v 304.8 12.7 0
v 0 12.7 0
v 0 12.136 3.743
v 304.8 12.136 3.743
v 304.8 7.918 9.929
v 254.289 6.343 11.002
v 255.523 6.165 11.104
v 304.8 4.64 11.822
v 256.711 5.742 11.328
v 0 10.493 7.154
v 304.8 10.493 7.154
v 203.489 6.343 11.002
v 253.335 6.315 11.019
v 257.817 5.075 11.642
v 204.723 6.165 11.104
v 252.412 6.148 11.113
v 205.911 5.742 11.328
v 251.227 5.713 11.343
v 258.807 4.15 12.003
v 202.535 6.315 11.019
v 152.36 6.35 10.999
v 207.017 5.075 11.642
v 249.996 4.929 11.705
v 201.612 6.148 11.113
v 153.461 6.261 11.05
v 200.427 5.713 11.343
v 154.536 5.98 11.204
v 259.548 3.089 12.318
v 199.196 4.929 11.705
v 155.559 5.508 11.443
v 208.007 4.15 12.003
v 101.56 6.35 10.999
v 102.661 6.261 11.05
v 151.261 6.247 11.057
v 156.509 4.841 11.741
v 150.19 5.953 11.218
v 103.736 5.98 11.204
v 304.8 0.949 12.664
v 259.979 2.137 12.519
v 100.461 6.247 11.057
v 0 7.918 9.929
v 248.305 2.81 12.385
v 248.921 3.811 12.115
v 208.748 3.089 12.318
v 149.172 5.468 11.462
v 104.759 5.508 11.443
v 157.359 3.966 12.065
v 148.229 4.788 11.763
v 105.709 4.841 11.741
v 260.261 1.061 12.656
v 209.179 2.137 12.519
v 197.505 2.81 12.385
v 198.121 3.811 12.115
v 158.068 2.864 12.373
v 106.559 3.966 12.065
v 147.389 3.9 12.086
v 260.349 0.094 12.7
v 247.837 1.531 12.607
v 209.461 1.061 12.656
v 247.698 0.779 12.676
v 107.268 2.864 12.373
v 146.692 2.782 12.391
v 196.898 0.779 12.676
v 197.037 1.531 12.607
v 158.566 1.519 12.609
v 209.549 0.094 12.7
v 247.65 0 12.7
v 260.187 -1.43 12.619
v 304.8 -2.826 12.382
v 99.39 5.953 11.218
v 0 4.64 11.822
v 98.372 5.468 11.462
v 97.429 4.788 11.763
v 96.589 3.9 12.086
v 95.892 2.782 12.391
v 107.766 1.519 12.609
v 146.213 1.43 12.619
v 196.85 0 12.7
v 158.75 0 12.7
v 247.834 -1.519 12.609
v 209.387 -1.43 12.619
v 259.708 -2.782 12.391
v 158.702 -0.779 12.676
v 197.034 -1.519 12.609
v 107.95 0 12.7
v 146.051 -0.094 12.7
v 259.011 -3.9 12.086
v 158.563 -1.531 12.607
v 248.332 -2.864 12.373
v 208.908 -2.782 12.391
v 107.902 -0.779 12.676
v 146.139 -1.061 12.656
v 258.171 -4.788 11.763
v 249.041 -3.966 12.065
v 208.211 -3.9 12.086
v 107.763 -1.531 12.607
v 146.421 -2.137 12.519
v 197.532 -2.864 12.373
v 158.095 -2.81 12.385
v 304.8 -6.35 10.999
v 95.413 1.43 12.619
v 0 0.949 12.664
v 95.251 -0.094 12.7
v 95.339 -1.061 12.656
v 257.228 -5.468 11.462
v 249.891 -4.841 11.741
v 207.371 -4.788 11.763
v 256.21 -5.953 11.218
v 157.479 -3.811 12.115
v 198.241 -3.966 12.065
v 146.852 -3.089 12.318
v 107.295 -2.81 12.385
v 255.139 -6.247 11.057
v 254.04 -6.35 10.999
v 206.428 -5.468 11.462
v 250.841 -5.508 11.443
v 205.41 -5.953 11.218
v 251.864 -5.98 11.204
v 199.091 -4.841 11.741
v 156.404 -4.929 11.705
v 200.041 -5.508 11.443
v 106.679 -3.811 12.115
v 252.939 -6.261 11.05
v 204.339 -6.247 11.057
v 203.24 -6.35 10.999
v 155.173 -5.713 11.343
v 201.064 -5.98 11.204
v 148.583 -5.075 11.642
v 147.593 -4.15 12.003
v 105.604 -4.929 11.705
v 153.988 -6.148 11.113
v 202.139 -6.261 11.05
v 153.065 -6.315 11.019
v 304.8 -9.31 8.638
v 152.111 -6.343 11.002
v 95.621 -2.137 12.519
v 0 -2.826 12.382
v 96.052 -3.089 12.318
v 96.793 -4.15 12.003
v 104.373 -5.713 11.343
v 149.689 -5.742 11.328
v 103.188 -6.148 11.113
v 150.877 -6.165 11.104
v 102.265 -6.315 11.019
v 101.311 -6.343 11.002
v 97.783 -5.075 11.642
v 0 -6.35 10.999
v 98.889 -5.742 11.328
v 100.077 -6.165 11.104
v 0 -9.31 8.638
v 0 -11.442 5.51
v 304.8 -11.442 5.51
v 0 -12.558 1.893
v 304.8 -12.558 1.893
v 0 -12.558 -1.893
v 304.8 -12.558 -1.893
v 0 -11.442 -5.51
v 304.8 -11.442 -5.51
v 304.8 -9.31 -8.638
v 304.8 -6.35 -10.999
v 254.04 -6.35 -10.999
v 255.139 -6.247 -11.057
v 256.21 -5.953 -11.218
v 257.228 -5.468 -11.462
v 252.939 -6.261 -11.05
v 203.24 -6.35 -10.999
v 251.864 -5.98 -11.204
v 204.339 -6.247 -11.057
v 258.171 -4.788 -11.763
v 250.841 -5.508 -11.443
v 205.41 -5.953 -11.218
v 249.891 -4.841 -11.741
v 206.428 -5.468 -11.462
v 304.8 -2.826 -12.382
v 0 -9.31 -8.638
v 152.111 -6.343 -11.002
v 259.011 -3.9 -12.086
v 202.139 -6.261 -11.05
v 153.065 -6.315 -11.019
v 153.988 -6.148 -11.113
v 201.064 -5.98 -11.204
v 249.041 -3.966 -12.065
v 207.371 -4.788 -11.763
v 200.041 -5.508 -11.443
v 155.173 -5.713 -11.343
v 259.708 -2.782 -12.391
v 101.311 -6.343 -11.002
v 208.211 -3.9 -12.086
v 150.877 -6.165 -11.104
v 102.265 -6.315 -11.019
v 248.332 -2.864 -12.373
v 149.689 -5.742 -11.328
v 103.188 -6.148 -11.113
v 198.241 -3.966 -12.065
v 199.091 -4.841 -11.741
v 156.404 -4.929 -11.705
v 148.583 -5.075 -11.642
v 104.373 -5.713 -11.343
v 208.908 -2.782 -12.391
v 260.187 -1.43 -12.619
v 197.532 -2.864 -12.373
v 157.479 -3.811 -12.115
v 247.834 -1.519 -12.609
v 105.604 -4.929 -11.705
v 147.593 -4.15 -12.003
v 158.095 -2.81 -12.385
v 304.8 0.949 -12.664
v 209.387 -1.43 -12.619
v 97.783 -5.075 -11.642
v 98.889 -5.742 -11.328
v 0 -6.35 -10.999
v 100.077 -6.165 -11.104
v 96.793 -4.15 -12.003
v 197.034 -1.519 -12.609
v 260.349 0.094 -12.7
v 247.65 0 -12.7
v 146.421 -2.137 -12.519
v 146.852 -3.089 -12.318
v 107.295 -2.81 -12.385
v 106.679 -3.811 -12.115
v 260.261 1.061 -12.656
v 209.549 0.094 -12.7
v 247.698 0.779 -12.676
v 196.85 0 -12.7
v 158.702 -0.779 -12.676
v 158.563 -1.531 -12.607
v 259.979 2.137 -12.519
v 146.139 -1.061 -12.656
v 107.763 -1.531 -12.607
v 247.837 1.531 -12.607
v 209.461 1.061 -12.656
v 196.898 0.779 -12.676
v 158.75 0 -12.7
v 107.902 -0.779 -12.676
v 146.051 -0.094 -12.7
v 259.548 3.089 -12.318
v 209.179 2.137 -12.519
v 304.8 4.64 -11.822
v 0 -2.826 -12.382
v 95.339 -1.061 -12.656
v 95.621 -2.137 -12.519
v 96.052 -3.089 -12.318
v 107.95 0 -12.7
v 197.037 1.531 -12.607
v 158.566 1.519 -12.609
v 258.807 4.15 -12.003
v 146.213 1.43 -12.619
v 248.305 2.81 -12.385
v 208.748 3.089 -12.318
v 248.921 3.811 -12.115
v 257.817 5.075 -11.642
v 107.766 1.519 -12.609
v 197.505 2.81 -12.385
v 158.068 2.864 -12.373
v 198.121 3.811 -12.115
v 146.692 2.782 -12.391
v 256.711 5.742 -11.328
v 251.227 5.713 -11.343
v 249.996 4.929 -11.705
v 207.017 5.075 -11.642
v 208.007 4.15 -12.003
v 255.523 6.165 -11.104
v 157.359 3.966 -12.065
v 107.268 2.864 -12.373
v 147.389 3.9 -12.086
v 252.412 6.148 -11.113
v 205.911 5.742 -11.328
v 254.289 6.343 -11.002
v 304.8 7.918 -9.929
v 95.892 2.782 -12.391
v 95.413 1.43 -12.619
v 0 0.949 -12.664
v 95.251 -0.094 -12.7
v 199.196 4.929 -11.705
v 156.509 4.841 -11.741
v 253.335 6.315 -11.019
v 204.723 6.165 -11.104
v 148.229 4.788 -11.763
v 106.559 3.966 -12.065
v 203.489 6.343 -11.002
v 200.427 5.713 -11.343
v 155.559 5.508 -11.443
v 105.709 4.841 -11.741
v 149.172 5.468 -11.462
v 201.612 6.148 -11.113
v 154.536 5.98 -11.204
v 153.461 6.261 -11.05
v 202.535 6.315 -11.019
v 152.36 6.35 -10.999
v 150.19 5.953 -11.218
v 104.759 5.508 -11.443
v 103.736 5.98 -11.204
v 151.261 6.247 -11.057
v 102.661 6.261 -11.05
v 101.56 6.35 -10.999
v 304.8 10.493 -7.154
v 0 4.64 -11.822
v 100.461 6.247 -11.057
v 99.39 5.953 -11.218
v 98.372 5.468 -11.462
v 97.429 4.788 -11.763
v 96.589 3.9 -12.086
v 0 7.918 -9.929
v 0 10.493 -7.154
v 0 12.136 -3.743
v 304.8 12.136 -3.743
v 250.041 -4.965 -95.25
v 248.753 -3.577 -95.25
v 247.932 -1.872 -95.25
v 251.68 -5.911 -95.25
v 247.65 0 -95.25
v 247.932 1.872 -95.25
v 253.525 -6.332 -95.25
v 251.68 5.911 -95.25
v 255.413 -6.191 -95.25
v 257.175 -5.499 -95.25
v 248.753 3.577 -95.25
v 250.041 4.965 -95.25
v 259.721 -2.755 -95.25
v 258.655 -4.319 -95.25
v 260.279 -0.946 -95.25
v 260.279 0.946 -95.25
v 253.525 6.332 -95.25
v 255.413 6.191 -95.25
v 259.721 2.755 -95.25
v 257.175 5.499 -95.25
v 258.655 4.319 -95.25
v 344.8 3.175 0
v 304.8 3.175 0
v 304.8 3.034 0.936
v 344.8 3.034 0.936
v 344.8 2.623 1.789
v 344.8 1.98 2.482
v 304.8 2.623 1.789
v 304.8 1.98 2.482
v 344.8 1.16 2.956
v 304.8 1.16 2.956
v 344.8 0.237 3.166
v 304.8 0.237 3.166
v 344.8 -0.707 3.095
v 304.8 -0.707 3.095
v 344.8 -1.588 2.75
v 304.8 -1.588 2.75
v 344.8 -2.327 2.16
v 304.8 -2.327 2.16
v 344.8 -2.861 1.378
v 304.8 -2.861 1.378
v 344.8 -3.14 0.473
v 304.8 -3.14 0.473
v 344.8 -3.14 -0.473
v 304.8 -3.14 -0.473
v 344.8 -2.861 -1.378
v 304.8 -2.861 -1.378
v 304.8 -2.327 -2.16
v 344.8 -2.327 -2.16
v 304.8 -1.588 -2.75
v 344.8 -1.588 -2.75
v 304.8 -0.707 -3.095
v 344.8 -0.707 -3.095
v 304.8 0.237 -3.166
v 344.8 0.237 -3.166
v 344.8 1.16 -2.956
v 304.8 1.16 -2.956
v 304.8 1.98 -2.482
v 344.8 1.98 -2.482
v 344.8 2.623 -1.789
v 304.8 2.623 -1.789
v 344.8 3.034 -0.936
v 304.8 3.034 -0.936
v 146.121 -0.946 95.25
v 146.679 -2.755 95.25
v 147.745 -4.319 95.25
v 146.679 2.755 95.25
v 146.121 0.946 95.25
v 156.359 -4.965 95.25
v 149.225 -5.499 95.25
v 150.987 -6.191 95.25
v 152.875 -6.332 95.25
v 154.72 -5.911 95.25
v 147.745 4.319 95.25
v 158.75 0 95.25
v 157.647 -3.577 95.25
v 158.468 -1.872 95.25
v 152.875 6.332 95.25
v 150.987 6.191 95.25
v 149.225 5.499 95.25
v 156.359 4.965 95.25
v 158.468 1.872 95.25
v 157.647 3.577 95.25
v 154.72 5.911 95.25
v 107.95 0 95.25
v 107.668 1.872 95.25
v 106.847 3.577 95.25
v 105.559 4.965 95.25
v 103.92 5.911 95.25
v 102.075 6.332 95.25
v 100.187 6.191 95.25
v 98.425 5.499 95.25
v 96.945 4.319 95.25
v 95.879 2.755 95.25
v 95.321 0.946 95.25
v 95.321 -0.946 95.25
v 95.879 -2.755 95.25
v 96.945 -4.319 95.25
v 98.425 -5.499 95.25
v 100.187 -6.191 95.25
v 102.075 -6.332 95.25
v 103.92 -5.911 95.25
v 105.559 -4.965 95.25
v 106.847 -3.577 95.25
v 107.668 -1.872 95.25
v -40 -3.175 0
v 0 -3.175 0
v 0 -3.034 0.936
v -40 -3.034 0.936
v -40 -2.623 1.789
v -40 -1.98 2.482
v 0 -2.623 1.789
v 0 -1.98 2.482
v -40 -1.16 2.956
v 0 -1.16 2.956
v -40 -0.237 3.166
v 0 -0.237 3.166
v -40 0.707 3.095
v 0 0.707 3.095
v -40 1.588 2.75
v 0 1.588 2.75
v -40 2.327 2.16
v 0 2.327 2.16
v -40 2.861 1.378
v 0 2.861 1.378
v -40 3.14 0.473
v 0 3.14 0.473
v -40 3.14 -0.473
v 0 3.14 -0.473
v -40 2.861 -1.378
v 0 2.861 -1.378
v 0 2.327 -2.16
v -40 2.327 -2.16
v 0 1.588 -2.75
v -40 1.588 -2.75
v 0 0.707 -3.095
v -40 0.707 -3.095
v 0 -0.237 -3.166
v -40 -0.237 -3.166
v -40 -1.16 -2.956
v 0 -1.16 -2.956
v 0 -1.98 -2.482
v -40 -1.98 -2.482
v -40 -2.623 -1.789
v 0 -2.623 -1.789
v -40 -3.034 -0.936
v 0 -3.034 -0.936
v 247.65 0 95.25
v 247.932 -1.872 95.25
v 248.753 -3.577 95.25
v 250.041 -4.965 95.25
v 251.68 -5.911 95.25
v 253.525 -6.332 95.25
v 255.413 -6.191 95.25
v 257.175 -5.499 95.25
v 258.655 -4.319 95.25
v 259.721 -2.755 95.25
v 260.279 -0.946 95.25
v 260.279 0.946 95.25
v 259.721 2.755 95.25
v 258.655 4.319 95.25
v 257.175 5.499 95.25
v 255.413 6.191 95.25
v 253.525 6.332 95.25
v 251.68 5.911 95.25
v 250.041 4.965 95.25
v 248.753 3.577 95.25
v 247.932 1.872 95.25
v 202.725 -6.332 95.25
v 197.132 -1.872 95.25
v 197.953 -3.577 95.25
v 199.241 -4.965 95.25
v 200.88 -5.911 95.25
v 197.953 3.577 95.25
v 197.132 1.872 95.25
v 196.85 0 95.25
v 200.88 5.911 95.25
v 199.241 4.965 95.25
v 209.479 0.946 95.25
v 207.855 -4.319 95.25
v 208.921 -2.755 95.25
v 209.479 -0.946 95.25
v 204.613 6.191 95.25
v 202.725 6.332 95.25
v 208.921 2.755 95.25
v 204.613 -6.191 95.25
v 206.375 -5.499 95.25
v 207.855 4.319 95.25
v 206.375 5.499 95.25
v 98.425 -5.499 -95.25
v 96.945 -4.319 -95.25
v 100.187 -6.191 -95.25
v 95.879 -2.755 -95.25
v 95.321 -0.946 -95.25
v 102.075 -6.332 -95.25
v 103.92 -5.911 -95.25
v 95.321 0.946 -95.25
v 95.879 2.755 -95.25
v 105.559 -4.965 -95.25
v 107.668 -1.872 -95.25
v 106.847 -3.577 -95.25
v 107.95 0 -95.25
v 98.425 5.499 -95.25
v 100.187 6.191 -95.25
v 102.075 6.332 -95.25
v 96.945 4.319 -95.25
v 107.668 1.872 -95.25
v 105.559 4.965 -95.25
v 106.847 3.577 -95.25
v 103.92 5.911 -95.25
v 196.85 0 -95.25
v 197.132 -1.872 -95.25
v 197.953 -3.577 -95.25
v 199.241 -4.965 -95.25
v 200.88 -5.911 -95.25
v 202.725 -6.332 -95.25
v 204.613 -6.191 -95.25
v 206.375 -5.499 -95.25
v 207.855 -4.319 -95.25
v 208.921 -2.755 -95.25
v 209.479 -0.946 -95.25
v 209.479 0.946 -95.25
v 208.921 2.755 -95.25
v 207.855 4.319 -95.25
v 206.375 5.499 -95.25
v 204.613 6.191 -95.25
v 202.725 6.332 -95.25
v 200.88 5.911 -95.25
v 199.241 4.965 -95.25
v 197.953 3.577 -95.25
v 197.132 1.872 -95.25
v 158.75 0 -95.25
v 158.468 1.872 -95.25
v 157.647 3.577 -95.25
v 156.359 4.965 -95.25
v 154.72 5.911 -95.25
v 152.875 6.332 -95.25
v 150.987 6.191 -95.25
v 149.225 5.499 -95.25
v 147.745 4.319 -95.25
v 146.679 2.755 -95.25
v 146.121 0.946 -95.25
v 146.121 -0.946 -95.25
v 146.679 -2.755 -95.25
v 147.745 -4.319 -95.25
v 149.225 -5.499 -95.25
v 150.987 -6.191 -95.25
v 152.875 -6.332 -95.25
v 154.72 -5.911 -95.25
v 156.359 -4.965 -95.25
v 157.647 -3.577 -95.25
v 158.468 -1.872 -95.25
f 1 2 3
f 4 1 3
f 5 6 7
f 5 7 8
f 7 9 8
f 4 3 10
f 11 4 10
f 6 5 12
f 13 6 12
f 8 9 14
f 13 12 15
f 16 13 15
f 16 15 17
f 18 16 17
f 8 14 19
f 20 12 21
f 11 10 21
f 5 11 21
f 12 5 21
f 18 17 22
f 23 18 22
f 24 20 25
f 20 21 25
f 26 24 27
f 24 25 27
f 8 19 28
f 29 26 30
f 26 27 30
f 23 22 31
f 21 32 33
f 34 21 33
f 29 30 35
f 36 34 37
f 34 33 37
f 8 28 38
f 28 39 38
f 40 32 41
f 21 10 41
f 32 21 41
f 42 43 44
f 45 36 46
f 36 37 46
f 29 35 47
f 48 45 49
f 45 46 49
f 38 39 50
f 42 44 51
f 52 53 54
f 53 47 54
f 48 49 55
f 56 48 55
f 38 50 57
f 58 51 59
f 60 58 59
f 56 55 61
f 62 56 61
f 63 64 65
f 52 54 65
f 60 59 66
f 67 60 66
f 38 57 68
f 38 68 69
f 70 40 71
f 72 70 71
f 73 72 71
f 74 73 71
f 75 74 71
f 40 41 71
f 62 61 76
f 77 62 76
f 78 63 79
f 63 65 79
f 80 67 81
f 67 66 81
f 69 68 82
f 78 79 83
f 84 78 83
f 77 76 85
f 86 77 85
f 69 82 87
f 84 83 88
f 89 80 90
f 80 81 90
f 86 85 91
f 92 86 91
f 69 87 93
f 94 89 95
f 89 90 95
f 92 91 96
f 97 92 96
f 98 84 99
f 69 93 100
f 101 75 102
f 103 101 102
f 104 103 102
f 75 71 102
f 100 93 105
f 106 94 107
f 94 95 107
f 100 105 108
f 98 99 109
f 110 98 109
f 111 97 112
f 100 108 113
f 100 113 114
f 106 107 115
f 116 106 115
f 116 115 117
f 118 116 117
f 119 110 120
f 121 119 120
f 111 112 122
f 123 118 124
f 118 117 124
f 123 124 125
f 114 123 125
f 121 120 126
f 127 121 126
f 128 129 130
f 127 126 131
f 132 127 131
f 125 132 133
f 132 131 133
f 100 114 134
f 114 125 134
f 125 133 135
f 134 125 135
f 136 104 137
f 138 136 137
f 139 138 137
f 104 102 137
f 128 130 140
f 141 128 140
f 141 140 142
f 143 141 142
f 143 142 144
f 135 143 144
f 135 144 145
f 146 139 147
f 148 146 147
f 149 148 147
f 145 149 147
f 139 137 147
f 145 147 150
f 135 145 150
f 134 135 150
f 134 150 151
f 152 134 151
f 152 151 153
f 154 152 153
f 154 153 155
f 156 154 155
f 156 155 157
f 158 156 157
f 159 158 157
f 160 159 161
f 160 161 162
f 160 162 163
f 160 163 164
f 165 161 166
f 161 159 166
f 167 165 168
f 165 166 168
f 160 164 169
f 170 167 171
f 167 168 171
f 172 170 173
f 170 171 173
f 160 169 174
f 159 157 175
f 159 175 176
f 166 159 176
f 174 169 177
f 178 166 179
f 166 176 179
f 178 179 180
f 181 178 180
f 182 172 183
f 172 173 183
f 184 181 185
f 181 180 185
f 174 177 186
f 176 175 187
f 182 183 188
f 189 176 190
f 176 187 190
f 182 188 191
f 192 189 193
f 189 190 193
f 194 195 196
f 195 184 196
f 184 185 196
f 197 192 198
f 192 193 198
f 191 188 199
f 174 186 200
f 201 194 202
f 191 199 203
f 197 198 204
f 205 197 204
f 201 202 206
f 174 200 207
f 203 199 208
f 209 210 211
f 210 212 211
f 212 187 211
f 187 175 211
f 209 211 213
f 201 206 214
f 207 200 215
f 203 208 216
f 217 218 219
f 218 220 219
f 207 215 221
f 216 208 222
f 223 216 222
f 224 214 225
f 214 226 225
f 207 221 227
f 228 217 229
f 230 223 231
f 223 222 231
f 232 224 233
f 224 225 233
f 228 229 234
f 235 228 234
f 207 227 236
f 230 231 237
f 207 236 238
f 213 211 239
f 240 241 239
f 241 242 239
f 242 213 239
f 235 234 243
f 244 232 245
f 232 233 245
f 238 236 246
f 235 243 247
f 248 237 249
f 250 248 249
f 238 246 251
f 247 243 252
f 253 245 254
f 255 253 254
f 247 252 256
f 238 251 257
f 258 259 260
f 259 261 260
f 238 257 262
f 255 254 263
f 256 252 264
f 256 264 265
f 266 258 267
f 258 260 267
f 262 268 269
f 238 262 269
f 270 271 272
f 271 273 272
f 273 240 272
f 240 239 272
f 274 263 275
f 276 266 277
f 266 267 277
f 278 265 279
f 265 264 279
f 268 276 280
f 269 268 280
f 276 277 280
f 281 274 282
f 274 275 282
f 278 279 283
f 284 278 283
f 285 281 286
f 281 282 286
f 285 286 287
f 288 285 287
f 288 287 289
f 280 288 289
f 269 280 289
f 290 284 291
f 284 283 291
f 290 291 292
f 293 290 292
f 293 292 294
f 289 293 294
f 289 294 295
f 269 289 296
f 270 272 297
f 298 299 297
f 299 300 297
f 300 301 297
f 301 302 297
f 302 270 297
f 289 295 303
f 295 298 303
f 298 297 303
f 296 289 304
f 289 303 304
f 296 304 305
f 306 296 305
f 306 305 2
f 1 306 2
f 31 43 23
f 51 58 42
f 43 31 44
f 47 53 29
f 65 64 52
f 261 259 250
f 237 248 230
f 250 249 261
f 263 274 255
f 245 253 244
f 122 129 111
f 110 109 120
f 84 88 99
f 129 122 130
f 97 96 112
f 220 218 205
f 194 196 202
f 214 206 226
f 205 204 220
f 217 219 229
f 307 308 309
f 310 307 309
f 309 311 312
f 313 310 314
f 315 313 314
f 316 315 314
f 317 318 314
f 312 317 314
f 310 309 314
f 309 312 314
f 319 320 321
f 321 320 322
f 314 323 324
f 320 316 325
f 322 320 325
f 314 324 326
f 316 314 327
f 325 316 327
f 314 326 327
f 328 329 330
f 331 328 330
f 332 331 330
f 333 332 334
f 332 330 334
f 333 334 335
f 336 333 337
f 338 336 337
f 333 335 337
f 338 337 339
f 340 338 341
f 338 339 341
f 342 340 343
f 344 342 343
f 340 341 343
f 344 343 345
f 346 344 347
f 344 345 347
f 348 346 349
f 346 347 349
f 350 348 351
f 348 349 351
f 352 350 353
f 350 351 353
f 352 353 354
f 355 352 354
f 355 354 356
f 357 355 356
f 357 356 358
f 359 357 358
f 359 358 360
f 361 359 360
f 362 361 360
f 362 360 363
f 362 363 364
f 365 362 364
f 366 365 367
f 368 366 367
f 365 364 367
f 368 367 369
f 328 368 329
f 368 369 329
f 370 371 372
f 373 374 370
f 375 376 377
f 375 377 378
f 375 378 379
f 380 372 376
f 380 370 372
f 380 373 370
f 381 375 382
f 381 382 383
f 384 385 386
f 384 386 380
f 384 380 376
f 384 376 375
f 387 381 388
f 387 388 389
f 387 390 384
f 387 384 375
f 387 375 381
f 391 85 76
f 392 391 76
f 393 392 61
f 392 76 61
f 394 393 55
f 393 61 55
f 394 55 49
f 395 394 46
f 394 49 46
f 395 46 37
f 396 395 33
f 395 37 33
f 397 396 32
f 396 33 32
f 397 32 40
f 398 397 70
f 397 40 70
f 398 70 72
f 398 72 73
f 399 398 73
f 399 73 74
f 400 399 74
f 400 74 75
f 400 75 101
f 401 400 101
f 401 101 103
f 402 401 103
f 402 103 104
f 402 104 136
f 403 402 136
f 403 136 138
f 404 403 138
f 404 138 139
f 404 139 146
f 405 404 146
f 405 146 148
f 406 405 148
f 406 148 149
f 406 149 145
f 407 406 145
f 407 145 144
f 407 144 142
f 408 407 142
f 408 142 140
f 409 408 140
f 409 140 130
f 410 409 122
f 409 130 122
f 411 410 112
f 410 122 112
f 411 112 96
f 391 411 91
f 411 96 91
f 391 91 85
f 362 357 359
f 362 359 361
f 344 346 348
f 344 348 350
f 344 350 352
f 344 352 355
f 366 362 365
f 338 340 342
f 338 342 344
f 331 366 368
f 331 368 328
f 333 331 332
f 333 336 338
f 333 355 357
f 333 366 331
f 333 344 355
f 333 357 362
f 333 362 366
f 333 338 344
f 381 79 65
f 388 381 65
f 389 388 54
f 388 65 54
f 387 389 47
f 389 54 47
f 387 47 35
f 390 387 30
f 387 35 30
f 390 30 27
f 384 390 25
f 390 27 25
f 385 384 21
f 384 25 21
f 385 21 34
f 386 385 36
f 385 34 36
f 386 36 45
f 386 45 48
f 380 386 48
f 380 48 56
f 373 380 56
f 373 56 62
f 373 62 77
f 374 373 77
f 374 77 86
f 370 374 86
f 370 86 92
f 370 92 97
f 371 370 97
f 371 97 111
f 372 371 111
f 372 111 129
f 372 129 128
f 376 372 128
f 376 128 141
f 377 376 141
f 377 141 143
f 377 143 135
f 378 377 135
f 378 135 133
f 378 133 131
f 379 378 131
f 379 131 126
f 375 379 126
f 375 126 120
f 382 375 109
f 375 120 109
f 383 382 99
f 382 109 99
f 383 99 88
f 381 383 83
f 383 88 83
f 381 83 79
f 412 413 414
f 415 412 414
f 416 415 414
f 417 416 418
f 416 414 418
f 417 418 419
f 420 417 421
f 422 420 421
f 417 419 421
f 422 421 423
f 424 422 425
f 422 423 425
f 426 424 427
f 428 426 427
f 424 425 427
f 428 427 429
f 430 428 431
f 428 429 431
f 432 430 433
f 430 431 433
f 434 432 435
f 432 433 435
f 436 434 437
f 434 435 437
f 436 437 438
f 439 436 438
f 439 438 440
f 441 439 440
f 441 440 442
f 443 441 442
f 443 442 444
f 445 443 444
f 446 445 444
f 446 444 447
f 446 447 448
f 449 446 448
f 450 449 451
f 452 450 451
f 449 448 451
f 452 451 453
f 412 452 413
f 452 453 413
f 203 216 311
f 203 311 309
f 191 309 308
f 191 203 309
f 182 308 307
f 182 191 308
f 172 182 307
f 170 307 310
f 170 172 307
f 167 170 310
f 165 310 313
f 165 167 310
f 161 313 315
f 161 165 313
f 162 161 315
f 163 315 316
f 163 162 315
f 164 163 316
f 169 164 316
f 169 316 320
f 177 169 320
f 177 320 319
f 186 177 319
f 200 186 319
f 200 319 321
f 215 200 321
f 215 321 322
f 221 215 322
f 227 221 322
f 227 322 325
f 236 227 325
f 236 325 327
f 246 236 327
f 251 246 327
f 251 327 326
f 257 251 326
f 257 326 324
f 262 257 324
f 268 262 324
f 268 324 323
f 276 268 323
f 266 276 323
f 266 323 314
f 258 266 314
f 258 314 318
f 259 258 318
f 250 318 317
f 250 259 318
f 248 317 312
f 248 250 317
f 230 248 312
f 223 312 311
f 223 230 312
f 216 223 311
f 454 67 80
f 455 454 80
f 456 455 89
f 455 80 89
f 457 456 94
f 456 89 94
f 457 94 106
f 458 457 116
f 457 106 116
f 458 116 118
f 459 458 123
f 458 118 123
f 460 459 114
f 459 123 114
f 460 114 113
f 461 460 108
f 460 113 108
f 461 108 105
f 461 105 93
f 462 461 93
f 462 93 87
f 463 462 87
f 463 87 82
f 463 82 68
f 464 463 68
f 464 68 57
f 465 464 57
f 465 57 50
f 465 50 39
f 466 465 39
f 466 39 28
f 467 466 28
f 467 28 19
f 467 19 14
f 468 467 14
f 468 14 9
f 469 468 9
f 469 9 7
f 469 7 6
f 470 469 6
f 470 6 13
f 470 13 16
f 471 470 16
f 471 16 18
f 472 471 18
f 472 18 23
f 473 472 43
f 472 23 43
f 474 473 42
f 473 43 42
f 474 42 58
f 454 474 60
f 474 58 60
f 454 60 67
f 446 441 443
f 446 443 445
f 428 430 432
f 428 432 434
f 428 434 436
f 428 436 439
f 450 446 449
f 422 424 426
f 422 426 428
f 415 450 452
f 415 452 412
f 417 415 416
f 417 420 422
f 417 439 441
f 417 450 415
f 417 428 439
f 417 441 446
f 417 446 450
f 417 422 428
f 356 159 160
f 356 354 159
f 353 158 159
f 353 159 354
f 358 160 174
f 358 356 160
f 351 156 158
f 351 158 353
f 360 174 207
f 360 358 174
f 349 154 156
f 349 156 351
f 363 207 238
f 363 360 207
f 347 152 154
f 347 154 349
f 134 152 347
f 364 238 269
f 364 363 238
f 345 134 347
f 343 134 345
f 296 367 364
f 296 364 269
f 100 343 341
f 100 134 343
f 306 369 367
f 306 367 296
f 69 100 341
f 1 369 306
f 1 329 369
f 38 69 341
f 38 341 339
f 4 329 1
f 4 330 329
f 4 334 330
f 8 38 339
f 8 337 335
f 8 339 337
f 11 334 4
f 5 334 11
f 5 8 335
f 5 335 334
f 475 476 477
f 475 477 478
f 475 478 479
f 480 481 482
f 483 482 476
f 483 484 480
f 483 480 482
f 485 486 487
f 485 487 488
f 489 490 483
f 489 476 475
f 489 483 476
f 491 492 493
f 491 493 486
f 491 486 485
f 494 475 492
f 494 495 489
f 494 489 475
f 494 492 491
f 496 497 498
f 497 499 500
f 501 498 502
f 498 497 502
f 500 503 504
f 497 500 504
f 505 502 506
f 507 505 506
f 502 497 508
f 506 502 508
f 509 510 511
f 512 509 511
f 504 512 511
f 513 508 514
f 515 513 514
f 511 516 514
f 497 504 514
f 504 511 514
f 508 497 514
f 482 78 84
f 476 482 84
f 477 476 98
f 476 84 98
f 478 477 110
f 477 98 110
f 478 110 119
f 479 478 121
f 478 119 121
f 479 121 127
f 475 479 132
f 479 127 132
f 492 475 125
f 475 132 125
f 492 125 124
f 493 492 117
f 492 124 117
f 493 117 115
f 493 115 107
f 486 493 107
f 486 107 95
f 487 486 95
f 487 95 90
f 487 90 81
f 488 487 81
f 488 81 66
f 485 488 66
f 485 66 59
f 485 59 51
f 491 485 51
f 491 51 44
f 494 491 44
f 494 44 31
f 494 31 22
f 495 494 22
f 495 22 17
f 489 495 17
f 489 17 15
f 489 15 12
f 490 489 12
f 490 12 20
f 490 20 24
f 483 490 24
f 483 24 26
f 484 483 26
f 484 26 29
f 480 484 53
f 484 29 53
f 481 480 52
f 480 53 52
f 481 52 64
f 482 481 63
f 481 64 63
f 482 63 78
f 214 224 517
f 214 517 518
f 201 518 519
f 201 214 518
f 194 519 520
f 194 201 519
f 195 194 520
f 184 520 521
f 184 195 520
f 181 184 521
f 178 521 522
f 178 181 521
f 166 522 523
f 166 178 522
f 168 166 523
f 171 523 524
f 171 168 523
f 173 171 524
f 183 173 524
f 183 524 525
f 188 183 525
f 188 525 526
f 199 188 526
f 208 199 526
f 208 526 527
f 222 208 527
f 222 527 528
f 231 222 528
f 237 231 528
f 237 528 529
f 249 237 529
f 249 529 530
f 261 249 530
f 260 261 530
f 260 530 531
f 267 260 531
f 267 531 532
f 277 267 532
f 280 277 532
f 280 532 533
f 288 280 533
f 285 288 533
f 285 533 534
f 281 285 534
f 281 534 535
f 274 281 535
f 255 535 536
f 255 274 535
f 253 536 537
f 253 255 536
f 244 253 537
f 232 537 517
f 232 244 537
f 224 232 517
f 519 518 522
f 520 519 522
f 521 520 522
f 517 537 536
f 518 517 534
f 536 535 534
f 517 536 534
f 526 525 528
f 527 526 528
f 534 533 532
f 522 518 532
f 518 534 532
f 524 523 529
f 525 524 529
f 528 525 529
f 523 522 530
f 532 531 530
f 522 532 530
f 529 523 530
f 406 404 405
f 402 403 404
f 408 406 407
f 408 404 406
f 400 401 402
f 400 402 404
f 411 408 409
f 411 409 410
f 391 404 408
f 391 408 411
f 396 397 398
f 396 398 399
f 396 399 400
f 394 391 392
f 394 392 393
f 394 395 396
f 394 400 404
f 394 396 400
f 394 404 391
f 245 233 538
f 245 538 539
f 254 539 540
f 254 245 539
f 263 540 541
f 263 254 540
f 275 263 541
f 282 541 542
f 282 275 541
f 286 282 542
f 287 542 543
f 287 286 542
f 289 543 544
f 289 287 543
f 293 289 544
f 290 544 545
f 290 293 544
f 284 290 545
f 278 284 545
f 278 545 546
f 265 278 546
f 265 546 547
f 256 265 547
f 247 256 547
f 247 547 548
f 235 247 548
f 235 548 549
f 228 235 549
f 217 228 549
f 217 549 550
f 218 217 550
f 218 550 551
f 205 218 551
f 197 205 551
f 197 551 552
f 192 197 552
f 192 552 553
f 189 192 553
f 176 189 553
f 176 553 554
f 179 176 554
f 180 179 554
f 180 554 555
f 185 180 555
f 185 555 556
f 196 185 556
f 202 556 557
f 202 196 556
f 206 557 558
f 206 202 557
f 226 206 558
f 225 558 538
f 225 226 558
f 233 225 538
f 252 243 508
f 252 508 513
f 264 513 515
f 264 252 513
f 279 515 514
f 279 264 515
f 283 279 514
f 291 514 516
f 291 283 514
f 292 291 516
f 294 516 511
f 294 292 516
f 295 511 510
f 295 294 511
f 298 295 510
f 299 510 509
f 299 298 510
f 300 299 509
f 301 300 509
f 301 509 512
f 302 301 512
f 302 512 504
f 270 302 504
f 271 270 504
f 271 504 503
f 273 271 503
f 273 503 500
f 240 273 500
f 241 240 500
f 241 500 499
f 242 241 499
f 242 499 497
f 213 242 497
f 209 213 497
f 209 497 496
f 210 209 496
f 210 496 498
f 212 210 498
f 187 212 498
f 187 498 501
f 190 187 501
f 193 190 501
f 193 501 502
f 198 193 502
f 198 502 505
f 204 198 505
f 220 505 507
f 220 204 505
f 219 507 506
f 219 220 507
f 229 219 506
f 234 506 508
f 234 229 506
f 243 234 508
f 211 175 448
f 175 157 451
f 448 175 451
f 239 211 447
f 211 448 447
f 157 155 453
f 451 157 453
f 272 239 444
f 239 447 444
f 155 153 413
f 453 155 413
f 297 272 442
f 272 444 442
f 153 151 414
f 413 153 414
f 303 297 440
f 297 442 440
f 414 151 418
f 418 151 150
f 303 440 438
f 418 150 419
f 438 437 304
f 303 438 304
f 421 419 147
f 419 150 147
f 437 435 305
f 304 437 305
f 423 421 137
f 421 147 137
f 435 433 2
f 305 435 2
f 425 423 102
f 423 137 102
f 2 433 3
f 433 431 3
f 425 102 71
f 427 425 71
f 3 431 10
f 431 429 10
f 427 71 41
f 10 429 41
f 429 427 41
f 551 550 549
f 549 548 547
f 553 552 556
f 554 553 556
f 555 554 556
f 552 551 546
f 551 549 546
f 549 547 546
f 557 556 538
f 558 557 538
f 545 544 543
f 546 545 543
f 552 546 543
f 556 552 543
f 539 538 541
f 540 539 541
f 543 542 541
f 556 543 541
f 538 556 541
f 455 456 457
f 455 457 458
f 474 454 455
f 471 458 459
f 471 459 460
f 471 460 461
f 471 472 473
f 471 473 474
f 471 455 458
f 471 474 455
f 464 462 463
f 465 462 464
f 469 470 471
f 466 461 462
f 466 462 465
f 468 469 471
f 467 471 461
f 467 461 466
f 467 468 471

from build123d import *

# Parameters (mm, degrees)
F0_R          = 12.7
F1_DEPTH      = 304.8
F2_R          = 3.175
F3_DEPTH      = 40
F4_R          = 3.175
F5_DEPTH      = 40
F7_DEPTH      = 95.25
F7_DEPTH_BACK = 95.25


with BuildPart() as f1:
    # F0 (on Right) → F1 (new body)
    with BuildSketch(Plane.YZ):
        Circle(F0_R)
    extrude(amount=F1_DEPTH)

    # F2 (on face) → F3 (join)
    with BuildSketch(Plane(origin=(0, 0, 0), x_dir=(0, -1, 0), z_dir=(-1, 0, 0))):
        Circle(F2_R)
    extrude(amount=F3_DEPTH)

    # F4 (on face) → F5 (join)
    with BuildSketch(Plane.YZ.offset(304.8)):
        Circle(F4_R)
    extrude(amount=F5_DEPTH)

    # F6 (on Top) → F7 (join, two sides)
    with BuildSketch(Plane.XY) as f7_sk:
        with BuildLine():
            Line((203.2, 0), (209.55, 0))
            ThreePointArc((209.55, 0), (203.2, 6.35), (196.85, 0))
            Line((196.85, 0), (203.2, 0))
        make_face()
        with BuildLine():
            ThreePointArc((95.25, 0), (101.6, -6.35), (107.95, 0))
            Line((107.95, 0), (101.6, 0))
            Line((101.6, 0), (95.25, 0))
        make_face()
        with BuildLine():
            Line((101.6, 0), (107.95, 0))
            ThreePointArc((107.95, 0), (101.6, 6.35), (95.25, 0))
            Line((95.25, 0), (101.6, 0))
        make_face()
        with BuildLine():
            ThreePointArc((146.05, 0), (152.4, -6.35), (158.75, 0))
            Line((158.75, 0), (152.4, 0))
            Line((152.4, 0), (146.05, 0))
        make_face()
        with BuildLine():
            Line((152.4, 0), (158.75, 0))
            ThreePointArc((158.75, 0), (152.4, 6.35), (146.05, 0))
            Line((146.05, 0), (152.4, 0))
        make_face()
        with BuildLine():
            ThreePointArc((196.85, 0), (203.2, -6.35), (209.55, 0))
            Line((209.55, 0), (203.2, 0))
            Line((203.2, 0), (196.85, 0))
        make_face()
        with BuildLine():
            ThreePointArc((260.35, 0), (254, 6.35), (247.65, 0))
            ThreePointArc((247.65, 0), (254, -6.35), (260.35, 0))
        make_face()
    extrude(amount=F7_DEPTH)
    extrude(f7_sk.sketch, amount=-F7_DEPTH_BACK)


solid = f1.part
